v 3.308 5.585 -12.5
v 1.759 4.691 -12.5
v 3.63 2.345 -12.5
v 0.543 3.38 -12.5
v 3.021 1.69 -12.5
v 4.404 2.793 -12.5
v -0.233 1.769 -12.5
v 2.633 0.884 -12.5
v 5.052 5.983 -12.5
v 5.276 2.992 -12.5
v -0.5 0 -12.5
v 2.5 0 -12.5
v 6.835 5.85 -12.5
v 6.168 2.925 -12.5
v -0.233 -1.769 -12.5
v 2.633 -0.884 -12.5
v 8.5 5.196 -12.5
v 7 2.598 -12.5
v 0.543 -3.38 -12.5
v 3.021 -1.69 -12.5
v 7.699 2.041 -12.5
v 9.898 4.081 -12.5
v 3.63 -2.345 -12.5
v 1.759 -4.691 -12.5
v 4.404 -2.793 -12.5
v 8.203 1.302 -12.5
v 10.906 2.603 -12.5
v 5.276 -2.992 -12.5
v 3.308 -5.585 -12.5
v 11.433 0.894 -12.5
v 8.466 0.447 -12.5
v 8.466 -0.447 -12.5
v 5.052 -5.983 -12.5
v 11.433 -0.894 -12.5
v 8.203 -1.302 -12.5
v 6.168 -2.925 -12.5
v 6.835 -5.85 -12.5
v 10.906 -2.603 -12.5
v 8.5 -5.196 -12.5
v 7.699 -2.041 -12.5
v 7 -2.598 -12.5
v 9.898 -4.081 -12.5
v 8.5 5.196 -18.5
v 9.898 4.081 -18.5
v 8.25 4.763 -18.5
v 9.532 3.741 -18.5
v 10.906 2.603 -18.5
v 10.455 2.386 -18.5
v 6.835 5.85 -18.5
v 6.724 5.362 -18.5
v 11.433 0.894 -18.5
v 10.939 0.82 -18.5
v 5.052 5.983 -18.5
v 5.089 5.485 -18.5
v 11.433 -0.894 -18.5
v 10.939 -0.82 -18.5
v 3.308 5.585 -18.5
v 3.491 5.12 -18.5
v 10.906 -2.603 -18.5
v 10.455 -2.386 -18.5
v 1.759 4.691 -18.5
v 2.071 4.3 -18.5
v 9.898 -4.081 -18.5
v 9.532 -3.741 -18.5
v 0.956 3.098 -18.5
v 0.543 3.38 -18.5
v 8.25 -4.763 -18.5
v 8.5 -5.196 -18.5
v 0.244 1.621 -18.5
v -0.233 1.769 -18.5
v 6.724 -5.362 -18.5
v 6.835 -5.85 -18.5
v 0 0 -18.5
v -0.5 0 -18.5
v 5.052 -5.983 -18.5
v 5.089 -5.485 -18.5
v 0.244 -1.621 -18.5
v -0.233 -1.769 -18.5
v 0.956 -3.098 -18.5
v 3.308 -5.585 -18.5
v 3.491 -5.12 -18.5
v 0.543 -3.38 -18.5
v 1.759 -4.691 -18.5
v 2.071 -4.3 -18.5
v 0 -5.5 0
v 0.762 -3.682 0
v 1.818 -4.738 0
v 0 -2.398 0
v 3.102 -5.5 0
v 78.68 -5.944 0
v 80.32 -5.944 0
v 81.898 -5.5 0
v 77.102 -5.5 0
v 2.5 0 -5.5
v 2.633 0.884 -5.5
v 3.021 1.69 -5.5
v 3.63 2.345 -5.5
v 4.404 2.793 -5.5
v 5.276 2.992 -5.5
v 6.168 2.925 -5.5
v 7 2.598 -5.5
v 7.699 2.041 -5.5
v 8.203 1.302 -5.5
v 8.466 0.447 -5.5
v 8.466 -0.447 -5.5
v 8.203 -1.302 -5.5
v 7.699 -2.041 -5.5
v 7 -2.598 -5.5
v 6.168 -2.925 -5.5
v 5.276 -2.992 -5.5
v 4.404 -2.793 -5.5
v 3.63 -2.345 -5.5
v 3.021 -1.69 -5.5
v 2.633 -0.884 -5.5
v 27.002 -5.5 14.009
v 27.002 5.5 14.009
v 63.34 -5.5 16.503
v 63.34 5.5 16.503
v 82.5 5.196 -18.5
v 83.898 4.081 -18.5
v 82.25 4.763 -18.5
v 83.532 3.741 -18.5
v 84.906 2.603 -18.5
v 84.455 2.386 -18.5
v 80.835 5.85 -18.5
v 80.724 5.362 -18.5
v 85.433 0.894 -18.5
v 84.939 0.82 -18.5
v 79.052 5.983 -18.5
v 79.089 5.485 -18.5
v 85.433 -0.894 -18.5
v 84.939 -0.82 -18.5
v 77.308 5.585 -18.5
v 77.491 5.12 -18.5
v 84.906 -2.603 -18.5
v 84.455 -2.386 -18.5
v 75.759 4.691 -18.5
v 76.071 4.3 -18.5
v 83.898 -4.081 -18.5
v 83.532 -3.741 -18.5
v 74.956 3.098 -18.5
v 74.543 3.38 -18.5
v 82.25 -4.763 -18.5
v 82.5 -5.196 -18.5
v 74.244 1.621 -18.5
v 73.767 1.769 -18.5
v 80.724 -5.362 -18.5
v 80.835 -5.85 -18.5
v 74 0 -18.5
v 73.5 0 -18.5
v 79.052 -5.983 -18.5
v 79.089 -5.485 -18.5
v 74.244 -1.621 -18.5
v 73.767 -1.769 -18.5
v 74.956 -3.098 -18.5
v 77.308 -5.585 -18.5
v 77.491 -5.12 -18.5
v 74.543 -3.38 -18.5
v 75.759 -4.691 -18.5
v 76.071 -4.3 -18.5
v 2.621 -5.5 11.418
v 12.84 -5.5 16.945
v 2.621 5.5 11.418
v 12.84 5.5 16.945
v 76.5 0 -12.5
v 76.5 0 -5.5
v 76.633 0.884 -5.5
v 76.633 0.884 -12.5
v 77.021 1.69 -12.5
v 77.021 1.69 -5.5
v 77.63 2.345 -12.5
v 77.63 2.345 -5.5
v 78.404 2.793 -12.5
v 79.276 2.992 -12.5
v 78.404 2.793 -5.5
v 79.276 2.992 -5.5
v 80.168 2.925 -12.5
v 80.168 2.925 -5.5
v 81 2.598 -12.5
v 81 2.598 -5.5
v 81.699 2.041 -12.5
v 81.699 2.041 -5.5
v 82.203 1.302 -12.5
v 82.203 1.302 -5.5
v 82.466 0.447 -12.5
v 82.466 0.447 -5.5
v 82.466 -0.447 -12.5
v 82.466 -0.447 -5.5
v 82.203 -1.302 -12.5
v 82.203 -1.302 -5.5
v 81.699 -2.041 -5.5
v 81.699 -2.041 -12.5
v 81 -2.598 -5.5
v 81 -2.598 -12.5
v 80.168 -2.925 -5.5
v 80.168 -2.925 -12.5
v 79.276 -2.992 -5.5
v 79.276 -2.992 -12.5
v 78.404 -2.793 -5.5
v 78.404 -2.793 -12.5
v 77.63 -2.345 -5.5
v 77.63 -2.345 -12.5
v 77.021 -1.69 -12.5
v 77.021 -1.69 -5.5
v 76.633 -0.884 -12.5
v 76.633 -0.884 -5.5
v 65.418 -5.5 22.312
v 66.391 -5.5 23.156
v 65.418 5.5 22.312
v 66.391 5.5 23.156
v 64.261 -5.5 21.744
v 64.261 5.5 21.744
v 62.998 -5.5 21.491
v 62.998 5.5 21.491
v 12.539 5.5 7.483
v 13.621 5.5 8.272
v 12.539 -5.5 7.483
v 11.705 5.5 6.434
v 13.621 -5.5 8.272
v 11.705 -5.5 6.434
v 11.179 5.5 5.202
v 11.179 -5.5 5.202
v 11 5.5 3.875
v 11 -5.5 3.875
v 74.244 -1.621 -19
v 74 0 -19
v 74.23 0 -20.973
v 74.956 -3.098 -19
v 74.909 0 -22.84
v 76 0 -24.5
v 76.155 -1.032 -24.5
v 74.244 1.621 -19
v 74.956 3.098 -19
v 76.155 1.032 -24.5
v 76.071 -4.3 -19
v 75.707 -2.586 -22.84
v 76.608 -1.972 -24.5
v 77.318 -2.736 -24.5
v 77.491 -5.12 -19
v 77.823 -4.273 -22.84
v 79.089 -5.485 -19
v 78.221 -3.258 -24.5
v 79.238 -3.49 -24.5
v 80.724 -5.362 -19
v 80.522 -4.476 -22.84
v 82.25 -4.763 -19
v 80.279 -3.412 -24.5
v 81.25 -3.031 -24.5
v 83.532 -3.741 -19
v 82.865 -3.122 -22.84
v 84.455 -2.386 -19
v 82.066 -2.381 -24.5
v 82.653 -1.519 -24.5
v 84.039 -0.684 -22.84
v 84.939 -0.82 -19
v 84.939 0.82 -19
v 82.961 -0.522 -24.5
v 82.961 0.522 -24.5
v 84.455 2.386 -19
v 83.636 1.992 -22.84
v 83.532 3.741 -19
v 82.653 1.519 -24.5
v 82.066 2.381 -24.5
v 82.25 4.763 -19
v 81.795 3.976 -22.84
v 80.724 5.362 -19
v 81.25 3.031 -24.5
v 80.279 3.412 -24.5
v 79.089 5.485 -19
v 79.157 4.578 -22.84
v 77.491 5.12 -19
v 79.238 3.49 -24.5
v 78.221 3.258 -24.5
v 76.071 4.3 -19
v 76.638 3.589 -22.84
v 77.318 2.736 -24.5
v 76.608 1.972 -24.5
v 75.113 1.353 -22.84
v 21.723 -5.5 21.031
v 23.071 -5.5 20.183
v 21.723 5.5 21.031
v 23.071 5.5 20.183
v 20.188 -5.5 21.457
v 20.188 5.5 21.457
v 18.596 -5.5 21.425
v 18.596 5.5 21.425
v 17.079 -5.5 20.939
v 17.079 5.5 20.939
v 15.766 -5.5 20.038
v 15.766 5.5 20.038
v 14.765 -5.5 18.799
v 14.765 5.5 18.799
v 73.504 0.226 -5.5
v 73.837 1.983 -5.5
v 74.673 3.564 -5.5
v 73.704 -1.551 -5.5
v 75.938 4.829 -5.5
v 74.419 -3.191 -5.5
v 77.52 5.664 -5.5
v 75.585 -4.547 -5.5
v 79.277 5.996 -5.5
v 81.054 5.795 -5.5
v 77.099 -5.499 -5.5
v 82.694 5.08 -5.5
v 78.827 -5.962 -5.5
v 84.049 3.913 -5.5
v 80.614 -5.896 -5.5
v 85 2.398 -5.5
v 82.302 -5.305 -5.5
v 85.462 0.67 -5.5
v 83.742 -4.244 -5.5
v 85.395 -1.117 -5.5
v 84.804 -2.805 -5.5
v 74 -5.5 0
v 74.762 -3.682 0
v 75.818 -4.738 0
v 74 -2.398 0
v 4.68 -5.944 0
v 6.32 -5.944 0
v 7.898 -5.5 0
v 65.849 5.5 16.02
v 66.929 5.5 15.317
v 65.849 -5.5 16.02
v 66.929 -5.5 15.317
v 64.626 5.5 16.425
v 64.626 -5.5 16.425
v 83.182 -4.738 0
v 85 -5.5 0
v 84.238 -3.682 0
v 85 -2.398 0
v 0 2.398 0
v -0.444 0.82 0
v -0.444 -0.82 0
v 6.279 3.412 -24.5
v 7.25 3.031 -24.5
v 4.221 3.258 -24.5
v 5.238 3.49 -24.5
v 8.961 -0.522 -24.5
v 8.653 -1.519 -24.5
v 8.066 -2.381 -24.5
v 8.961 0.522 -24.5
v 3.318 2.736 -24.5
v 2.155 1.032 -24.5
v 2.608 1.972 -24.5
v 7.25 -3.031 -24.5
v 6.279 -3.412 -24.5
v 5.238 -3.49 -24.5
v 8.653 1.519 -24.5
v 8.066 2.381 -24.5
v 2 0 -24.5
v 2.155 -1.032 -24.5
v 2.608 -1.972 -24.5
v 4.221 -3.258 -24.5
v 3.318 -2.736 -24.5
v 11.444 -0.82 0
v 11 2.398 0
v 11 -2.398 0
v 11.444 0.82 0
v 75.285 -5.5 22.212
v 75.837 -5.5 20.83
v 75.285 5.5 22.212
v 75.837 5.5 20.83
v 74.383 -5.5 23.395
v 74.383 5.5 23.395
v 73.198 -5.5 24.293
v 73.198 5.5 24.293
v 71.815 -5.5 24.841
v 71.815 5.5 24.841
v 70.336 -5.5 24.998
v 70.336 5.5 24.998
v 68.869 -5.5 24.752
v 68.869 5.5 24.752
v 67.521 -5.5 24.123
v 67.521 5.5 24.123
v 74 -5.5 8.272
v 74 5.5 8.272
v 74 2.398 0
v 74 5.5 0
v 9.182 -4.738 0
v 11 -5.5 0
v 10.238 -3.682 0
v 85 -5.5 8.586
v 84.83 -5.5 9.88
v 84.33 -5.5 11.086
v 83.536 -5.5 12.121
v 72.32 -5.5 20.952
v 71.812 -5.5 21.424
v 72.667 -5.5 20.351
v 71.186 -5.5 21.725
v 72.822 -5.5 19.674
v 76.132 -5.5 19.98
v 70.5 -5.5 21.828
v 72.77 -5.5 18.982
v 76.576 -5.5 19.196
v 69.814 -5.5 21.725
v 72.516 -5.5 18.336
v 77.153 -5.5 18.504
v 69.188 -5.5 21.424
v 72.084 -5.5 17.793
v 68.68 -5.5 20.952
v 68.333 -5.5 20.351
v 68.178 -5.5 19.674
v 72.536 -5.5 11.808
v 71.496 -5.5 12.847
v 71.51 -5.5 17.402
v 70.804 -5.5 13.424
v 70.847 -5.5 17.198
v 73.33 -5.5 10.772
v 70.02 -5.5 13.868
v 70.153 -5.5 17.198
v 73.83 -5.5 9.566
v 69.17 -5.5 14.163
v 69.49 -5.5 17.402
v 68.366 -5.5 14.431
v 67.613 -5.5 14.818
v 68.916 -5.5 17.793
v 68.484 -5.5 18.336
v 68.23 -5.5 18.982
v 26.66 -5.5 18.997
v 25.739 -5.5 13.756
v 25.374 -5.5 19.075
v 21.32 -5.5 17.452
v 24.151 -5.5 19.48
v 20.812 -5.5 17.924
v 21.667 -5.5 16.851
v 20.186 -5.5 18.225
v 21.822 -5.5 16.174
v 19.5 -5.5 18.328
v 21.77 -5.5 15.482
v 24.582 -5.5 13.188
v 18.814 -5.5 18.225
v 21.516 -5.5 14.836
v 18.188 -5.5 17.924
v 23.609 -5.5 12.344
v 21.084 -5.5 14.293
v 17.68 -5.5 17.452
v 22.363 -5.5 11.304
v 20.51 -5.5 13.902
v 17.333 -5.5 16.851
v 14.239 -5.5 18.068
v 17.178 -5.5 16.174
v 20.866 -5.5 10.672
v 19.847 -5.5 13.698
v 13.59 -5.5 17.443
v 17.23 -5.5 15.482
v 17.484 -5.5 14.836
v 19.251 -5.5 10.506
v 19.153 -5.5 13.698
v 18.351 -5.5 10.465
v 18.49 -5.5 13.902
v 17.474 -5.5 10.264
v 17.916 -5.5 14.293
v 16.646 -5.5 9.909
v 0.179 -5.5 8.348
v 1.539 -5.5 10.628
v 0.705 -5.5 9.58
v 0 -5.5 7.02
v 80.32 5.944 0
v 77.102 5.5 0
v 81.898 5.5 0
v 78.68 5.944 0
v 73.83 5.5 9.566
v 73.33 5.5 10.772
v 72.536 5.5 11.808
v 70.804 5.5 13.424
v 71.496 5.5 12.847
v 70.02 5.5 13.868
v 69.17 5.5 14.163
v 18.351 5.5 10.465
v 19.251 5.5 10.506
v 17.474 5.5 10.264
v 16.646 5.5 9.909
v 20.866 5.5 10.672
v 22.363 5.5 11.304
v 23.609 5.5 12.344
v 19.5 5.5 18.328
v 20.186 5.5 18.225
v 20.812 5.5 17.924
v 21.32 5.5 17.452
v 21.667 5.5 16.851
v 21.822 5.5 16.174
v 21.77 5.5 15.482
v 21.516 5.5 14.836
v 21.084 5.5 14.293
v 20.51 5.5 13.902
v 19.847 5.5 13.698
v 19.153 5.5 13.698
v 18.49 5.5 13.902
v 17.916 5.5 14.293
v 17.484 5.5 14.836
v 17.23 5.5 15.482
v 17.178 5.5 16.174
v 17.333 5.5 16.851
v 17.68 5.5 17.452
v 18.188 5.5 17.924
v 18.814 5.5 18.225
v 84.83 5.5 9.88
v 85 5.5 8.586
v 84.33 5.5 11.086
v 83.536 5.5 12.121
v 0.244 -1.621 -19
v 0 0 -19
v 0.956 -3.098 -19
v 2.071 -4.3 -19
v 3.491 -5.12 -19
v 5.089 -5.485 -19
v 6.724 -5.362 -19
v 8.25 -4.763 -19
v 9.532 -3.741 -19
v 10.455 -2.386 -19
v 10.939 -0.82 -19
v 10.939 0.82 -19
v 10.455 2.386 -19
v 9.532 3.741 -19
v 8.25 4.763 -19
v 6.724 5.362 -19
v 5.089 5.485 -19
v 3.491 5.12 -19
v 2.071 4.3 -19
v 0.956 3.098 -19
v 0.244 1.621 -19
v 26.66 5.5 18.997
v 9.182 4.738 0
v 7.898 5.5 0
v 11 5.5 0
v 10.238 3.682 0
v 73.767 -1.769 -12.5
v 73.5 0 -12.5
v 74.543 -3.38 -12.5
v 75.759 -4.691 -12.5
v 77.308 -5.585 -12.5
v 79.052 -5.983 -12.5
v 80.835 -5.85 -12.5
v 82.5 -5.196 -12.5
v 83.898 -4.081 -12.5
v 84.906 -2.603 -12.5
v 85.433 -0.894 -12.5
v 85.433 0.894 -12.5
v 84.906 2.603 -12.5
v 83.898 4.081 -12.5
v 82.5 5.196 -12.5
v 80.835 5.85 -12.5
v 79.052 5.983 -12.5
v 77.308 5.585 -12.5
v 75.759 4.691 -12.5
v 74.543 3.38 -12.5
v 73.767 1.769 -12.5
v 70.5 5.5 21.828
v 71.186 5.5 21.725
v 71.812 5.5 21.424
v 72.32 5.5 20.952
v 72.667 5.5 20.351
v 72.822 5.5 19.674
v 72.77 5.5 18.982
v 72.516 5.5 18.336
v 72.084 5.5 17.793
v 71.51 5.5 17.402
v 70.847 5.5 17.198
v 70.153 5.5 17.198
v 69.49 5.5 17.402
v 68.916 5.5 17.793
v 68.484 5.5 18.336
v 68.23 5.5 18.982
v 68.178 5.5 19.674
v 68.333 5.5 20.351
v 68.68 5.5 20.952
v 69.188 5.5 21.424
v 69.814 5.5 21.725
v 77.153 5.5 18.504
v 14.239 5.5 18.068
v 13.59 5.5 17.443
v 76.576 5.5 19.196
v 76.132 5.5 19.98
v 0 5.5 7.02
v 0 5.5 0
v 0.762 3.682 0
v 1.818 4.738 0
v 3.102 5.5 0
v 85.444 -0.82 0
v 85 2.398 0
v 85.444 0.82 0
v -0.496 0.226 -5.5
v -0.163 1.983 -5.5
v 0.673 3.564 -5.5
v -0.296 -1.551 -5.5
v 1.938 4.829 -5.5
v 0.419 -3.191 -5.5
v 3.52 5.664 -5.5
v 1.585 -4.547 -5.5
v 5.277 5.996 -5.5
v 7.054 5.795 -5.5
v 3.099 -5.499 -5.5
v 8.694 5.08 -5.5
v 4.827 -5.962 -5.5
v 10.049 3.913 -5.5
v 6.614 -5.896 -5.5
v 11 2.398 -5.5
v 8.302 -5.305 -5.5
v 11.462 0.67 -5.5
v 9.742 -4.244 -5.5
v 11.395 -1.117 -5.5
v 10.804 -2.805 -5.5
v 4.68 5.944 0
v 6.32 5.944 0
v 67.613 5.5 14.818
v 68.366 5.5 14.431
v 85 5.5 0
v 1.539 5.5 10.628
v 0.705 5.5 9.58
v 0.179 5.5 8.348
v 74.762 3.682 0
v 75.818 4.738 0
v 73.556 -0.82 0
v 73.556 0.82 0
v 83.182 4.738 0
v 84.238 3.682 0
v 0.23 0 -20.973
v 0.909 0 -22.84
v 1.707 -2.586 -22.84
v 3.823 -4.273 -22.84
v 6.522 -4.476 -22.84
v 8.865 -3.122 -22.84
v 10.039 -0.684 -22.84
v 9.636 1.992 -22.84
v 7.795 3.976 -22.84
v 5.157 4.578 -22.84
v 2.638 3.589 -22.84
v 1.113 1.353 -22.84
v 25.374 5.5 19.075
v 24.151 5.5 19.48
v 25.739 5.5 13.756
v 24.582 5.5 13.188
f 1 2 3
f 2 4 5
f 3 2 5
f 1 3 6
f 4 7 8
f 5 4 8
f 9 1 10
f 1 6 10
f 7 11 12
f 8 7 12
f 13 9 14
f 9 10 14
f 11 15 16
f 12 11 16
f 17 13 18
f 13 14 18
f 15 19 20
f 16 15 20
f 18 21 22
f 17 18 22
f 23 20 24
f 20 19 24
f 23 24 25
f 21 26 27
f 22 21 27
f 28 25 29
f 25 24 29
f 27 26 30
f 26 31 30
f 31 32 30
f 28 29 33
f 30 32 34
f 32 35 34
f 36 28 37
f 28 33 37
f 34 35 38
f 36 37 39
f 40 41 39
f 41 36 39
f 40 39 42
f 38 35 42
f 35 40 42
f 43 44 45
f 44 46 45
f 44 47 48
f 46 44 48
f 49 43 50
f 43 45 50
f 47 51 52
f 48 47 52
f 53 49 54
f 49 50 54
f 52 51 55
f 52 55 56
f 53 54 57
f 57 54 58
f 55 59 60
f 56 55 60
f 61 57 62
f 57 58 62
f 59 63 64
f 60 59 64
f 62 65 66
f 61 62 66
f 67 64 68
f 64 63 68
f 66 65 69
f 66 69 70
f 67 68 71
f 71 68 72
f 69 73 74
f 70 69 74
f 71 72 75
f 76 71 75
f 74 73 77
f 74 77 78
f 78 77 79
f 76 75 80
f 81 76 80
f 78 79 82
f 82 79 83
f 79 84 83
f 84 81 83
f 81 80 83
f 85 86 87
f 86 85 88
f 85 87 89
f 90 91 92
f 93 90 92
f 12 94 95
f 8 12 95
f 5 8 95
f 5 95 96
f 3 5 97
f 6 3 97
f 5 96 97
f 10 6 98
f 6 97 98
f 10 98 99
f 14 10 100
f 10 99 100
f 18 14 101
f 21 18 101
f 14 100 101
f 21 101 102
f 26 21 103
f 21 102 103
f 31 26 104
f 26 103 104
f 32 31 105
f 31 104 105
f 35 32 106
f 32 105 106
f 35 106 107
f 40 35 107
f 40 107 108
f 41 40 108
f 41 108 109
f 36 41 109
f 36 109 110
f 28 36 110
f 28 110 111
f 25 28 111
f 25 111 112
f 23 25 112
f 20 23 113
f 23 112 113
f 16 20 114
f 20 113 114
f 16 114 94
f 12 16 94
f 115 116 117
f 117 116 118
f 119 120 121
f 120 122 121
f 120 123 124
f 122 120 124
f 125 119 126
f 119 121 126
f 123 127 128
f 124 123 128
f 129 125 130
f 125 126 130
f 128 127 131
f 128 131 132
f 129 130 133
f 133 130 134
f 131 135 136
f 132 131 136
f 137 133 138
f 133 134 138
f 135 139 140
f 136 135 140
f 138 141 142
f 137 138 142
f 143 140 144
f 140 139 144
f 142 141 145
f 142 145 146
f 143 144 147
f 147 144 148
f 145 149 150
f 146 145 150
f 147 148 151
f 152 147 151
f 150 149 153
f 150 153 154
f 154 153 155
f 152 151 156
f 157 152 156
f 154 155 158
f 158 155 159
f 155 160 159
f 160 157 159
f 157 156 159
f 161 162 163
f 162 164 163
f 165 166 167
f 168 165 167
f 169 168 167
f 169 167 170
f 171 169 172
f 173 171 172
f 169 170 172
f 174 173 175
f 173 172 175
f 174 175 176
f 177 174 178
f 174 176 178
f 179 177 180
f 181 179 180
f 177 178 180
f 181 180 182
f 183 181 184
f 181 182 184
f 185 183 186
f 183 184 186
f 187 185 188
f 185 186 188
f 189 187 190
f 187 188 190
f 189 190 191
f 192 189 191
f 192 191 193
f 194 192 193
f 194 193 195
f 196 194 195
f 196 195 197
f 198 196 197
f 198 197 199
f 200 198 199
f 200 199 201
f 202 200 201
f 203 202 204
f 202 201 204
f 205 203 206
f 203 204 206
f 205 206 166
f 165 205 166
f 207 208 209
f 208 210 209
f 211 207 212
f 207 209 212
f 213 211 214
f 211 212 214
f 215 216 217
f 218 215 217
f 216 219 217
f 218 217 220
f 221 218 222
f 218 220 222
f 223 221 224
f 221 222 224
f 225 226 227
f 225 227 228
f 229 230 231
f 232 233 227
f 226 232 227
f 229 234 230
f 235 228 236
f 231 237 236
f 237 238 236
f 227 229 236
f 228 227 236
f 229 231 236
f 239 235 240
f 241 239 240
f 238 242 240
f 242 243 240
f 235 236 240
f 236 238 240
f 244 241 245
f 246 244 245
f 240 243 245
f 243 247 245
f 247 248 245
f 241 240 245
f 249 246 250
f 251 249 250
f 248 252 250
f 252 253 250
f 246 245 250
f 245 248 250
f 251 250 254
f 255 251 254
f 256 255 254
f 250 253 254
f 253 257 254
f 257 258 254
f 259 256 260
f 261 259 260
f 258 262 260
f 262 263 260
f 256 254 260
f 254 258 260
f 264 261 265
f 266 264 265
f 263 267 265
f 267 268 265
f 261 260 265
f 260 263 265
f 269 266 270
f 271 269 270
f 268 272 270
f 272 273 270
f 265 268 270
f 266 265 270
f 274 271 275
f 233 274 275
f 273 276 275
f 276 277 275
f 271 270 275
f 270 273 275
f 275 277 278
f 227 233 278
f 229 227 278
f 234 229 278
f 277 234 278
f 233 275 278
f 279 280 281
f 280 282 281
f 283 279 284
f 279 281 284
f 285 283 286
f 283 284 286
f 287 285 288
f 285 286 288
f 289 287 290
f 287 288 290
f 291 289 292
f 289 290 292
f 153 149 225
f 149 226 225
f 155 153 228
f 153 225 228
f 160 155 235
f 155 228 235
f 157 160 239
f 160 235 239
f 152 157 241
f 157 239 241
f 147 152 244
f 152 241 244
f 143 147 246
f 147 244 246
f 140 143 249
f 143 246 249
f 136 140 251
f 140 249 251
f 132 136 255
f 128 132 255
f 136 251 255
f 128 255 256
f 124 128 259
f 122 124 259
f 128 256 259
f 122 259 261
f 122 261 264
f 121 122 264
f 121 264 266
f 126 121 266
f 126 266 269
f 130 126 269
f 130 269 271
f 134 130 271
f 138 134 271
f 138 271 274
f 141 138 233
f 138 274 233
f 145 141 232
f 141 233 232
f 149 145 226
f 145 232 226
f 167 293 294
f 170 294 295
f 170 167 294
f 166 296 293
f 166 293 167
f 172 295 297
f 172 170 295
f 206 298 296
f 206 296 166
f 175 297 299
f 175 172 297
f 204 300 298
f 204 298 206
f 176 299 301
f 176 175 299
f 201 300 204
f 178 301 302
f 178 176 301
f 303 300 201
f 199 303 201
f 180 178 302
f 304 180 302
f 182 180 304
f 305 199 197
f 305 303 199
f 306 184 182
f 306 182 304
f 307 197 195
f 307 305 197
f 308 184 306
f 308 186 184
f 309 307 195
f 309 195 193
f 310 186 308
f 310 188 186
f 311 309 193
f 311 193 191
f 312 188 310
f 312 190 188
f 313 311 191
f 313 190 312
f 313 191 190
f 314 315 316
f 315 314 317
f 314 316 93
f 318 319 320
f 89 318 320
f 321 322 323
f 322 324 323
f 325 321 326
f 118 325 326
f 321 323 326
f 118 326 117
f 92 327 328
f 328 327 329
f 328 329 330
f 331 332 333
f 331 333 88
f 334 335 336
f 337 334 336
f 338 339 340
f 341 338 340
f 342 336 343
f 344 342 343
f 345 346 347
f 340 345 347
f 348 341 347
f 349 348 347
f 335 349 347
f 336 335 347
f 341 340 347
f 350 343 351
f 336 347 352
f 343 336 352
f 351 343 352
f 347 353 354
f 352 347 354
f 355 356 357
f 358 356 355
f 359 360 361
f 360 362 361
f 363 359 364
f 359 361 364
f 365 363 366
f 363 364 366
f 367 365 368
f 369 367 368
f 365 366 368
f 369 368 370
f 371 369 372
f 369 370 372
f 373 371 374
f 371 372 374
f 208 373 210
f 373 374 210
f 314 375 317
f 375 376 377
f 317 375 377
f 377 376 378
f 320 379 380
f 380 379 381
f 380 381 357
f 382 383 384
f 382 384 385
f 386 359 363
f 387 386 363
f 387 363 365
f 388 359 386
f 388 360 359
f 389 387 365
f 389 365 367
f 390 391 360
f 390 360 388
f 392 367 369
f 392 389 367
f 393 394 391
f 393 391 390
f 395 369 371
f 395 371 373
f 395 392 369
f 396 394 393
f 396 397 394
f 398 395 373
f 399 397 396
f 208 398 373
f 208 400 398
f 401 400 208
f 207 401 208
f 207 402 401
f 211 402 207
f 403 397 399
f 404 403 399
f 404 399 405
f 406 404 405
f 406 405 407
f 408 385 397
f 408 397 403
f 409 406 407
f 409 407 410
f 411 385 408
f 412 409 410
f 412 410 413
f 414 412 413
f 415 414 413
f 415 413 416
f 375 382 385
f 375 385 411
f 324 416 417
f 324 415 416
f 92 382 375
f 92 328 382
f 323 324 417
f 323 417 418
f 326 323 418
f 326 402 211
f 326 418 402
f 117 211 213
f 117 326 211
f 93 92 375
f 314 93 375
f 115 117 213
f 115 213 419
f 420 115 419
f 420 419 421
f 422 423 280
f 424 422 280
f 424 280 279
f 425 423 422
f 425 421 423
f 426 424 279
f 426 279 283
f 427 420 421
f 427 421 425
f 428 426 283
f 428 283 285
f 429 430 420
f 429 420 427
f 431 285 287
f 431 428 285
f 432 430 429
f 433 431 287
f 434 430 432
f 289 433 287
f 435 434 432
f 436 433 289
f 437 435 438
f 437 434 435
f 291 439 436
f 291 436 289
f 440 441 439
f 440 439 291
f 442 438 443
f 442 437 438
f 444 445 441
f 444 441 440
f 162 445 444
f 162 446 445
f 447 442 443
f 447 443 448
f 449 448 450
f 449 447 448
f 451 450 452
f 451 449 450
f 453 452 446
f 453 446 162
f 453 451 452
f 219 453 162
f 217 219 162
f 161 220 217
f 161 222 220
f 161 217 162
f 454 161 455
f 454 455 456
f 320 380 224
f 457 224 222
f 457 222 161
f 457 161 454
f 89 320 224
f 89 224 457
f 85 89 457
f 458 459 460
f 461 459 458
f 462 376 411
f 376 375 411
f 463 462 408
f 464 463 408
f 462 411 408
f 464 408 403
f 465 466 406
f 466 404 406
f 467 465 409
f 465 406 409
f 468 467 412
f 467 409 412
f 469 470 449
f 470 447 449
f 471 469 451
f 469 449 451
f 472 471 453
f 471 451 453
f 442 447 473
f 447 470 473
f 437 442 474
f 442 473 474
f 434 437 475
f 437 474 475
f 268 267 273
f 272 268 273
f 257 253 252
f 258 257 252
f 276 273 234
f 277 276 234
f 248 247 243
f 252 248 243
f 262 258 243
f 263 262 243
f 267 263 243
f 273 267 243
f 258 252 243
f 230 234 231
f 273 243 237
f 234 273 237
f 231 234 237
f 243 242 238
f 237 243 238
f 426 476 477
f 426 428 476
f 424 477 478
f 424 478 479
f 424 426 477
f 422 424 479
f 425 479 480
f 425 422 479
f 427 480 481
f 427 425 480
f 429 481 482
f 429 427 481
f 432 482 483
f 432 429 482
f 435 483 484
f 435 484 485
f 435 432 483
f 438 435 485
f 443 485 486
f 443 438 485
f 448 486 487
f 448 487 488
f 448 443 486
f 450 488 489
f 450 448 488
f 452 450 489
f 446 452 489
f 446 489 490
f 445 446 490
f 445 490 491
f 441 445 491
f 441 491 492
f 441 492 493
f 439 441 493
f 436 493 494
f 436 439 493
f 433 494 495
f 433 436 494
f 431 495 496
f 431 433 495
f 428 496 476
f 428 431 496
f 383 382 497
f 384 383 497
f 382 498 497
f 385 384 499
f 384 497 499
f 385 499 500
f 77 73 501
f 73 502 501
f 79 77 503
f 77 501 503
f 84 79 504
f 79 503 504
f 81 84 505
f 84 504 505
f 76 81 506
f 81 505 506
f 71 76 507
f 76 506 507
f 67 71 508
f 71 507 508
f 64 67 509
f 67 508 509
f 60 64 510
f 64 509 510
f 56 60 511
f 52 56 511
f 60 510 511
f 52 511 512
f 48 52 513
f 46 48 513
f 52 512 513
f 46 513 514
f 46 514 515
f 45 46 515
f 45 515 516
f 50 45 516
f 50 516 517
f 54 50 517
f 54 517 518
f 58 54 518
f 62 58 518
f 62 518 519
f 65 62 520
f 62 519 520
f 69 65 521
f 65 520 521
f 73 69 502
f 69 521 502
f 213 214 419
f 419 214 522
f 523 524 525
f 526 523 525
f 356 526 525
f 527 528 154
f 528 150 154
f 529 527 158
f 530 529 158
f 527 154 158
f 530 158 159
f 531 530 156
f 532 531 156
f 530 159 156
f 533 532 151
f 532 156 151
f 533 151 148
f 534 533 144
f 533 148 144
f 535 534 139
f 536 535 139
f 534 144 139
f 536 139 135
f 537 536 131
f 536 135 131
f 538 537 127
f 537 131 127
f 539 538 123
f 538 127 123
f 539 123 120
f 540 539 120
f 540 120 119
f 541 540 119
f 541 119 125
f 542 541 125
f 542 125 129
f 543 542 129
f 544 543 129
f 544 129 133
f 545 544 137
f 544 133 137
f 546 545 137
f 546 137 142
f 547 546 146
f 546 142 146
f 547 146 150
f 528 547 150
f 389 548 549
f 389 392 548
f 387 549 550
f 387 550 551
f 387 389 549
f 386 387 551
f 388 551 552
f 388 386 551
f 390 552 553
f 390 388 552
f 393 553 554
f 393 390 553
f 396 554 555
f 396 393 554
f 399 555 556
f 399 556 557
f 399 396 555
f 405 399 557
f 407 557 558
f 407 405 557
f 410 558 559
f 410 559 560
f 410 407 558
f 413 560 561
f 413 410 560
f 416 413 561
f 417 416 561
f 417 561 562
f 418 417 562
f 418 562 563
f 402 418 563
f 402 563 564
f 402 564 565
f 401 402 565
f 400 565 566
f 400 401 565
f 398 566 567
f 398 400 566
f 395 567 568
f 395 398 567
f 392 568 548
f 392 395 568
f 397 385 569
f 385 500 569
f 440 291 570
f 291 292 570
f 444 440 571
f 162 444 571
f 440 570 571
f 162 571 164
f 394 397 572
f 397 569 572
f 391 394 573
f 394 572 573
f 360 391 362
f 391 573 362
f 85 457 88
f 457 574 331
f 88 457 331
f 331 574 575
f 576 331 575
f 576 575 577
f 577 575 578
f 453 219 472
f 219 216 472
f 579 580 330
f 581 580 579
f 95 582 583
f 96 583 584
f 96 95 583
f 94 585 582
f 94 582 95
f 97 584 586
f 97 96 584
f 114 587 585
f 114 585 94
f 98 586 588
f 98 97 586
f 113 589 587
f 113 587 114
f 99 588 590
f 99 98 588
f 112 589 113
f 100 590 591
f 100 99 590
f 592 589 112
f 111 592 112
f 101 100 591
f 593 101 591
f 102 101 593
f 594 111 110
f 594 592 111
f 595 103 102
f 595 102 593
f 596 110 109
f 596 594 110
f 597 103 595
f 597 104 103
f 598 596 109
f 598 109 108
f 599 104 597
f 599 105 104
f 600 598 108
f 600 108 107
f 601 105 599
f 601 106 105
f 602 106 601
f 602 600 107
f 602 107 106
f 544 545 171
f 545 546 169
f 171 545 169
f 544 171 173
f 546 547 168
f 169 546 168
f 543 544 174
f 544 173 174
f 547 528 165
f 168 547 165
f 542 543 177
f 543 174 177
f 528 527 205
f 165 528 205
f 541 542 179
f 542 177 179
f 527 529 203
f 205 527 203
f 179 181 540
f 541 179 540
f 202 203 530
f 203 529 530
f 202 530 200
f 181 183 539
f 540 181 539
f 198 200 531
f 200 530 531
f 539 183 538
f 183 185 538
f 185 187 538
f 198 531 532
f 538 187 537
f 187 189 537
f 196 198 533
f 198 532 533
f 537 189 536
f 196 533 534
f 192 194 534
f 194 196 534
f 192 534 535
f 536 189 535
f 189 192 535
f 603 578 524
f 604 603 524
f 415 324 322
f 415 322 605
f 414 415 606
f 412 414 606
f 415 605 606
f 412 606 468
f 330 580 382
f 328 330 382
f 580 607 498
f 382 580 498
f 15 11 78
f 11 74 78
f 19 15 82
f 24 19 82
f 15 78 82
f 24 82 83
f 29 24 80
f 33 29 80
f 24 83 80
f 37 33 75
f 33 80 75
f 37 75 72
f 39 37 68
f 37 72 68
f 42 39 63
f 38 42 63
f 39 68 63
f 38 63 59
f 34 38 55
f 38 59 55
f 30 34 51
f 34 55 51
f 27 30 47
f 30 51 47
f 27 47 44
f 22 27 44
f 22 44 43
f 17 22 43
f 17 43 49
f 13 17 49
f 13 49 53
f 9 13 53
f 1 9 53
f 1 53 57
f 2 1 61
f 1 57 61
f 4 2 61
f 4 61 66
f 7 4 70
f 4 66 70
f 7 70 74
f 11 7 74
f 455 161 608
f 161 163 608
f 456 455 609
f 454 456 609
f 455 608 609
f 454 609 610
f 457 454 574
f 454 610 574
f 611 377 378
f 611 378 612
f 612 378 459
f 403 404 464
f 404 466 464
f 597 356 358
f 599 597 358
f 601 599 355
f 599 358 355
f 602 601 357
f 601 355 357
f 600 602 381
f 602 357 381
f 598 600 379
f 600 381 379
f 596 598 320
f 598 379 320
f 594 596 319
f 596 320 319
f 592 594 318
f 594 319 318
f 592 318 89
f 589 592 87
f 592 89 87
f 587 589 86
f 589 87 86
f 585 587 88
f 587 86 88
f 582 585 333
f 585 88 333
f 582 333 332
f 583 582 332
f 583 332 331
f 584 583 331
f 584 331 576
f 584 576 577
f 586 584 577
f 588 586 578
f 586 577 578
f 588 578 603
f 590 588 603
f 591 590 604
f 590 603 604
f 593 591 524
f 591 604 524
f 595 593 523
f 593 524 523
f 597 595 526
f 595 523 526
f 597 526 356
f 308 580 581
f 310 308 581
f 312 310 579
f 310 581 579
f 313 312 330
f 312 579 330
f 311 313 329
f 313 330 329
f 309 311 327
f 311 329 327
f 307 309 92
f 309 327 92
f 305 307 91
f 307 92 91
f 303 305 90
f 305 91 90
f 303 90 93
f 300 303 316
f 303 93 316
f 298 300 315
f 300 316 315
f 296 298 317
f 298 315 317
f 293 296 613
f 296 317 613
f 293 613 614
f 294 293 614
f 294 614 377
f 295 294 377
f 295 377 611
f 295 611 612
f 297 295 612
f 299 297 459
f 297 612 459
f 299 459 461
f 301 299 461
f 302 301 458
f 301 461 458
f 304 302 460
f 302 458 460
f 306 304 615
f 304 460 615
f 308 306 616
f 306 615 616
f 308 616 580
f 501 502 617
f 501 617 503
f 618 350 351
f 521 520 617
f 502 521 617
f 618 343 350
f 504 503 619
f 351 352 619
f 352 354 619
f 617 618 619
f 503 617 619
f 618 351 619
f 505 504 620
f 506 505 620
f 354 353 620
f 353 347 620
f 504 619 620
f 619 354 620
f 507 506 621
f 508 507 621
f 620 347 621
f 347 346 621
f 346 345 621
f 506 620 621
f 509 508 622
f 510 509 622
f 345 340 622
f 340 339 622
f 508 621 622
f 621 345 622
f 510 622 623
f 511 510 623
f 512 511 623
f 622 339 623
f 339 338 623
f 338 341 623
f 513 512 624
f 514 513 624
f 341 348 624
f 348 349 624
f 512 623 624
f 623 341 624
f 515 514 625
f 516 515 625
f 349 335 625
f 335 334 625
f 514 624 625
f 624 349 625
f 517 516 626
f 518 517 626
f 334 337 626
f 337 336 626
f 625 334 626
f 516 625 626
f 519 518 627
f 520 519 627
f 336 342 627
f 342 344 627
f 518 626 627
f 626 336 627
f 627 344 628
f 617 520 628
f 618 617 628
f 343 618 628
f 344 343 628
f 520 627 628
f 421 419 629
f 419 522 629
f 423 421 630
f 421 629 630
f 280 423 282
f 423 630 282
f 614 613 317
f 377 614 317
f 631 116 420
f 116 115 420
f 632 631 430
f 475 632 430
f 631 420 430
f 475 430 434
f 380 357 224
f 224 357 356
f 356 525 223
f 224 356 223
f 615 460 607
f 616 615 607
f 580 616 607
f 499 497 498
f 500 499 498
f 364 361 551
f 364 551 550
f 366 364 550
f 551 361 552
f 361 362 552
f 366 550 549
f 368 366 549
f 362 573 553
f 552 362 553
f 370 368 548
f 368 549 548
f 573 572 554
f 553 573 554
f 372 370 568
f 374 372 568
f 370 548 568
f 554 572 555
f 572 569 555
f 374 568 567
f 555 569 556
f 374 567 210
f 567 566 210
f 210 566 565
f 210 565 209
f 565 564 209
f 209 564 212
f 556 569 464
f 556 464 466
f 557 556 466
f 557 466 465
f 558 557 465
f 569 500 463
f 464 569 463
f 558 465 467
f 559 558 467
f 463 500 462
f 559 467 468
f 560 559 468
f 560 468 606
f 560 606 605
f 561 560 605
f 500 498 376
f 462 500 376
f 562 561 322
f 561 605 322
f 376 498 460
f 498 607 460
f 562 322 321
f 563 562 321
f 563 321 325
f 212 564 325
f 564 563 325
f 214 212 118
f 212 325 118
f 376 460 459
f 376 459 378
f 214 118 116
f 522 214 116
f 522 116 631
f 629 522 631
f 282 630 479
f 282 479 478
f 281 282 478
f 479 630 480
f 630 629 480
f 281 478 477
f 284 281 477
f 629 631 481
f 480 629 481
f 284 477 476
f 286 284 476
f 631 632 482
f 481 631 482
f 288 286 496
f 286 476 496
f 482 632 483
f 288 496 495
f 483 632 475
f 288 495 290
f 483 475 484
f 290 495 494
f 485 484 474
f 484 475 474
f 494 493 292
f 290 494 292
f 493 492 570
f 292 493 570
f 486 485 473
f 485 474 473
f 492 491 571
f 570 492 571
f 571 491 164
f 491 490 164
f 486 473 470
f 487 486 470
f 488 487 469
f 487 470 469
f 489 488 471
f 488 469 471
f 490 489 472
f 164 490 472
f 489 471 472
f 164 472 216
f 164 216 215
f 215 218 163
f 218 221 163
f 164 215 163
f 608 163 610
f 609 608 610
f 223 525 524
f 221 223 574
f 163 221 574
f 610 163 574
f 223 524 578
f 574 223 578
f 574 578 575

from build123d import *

# Parameters (mm, degrees)
SKETCH1_R           = 2.328285793
BOSS_EXTRUDE1_DEPTH = 5.5
FILLET1_R           = 5
SKETCH3_R           = 6
BOSS_EXTRUDE2_DEPTH = 5.5
SKETCH4_R           = 3
BOSS_EXTRUDE3_DEPTH = 7
LPATTERN1_COUNT     = 2
LPATTERN1_PITCH     = 74


with BuildPart() as part:
    # Sketch1 → Boss-Extrude1 (new, symmetric)
    with BuildSketch(Plane(origin=(0, 0, 0), x_dir=(1, 0, 0), z_dir=(0, 1, 0))):
        with BuildLine():
            Line((0, 0), (11, 0))
            Line((11, 0), (11, -6.854633107))
            Line((11, -6.854633107), (18.08275142, -10.685735567))
            ThreePointArc((18.08275142, -10.685735567), (21.90921539, -11.055742603), (24.558649677, -13.841281989))
            Line((24.558649677, -13.841281989), (65.78368238, -16.6704509))
            ThreePointArc((65.78368238, -16.6704509), (67.721094199, -14.75366641), (70.340842438, -14.002303312))
            Line((70.340842438, -14.002303312), (74, -10.343145751))
            Line((74, -10.343145751), (74, 0))
            Line((74, 0), (85, 0))
            Line((85, 0), (85, -10.656854249))
            Line((85, -10.656854249), (75.997696688, -19.659157562))
            ThreePointArc((75.997696688, -19.659157562), (71.523597121, -24.903910522), (65.441350323, -21.658718011))
            Line((65.441350323, -21.658718011), (24.21631762, -18.8295491))
            ThreePointArc((24.21631762, -18.8295491), (18.891090881, -21.466189686), (14.276625407, -17.722311778))
            Line((14.276625407, -17.722311778), (0, -10))
            Line((0, -10), (0, 0))
        make_face()
        with Locations(Location((19.5, -16, 0), (0, 0, 270))):
            Circle(SKETCH1_R, mode=Mode.SUBTRACT)
        with Locations(Location((70.5, -19.5, 0), (0, 0, 270))):
            Circle(SKETCH1_R, mode=Mode.SUBTRACT)
    extrude(amount=BOSS_EXTRUDE1_DEPTH, both=True)

    # Fillet1
    fillet1_edges = [part.edges().sort_by_distance(p)[0] for p in [
        (11, 0, 6.854633107),
        (18.08275142, 0, 10.685735567),
        (24.558649677, 0, 13.841281989),
        (65.78368238, 0, 16.6704509),
        (70.340842438, 0, 14.002303312),
        (74, 0, 10.343145751),
        (85, 0, 10.656854249),
        (75.997696688, 0, 19.659157562),
        (65.441350323, 0, 21.658718011),
        (24.21631762, 0, 18.8295491),
        (14.276625407, 0, 17.722311778),
        (0, 0, 10),
    ]]
    fillet(fillet1_edges, radius=FILLET1_R)

    # Sketch3 → Boss-Extrude2 (add)
    with BuildSketch(Plane(origin=(0, 0, 0), x_dir=(-1, 0, 0), z_dir=(0, 0, -1))):
        with Locations(Location((-79.5, 0, 0), (0, 0, 156.443535691))):
            Circle(SKETCH3_R)
        with Locations(Location((-5.5, 0, 0), (0, 0, 156.443535691))):
            Circle(SKETCH3_R)
    extrude(amount=BOSS_EXTRUDE2_DEPTH)

    # Sketch4 → Boss-Extrude3 (add)
    with BuildSketch(Plane(origin=(0, 0, -5.5), x_dir=(-1, 0, 0), z_dir=(0, 0, -1))):
        with Locations((-79.5, 0)):
            Circle(SKETCH4_R)
        with Locations((-5.5, 0)):
            Circle(SKETCH4_R)
    extrude(amount=BOSS_EXTRUDE3_DEPTH)

    # Sketch5 → Revolve1 (revolve)
    with BuildSketch(Plane(origin=(0, 0, 0), x_dir=(1, 0, 0), z_dir=(0, 1, 0)), mode=Mode.PRIVATE) as revolve1_sk:
        with BuildLine():
            Line((5.5, 12.5), (11.5, 12.5))
            Line((11.5, 12.5), (11.5, 18.5))
            Line((11.5, 18.5), (11, 18.5))
            Line((11, 18.5), (11, 19))
            ThreePointArc((11, 19), (10.484481189, 21.926174978), (9, 24.5))
            Line((9, 24.5), (5.5, 24.5))
            Line((5.5, 24.5), (5.5, 12.5))
        make_face()
    revolve1 = revolve(revolve1_sk.sketch.rotate(Axis((5.5, 0, -12.5), (0, 0, 1)), 180), axis=Axis((5.5, 0, -12.5), (0, 0, 1)))

    # LPattern1: Revolve1 ×2
    with Locations(*[(i * LPATTERN1_PITCH, 0, 0) for i in range(1, LPATTERN1_COUNT)]):
        add(revolve1)


solid = part.part
